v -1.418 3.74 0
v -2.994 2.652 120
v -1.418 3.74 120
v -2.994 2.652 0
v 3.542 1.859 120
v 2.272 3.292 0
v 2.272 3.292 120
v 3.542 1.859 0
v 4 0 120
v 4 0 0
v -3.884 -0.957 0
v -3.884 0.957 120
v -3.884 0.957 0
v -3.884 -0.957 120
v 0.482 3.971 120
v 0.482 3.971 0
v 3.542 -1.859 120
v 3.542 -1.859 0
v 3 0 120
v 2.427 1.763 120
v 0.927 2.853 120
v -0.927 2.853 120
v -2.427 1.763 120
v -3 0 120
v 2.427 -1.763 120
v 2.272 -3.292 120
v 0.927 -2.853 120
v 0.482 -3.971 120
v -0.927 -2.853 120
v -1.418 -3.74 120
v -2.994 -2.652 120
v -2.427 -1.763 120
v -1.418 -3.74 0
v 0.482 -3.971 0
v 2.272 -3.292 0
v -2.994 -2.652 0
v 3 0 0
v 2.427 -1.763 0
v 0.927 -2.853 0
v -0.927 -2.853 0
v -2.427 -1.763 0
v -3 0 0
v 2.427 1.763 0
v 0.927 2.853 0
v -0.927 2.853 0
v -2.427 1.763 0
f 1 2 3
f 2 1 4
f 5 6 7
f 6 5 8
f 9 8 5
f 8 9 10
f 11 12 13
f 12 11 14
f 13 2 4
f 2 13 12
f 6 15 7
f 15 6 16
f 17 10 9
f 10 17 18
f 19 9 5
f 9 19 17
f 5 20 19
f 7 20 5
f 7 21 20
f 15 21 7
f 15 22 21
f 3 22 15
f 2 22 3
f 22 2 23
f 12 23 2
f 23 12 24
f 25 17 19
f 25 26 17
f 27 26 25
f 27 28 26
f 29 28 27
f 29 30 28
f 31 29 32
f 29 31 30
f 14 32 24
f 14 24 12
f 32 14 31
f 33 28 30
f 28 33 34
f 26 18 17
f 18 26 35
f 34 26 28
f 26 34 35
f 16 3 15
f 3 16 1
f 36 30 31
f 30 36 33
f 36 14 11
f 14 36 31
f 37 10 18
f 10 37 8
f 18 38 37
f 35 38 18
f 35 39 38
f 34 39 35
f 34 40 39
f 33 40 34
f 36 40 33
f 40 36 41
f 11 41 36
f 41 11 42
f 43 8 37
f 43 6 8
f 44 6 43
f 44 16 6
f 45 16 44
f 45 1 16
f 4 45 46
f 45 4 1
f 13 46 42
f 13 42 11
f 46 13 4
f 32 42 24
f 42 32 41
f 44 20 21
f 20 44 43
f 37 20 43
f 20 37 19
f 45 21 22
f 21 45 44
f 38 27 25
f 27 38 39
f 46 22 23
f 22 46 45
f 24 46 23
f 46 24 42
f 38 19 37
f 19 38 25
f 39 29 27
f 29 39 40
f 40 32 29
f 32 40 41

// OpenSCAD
/*
	freiBot axis
	robot axis for freiBot
	2015 by stochri
*/

// ax: axis

axLength=120;
axDiameter=8;
axHole=6;

ring(axLength,axHole,axDiameter);

module ring(thickness,innerDiameter,outerDiameter)
{
	difference()
	{
		cylinder(thickness,outerDiameter/2,outerDiameter/2);
		cylinder(thickness,innerDiameter/2,innerDiameter/2);
	}	
}
